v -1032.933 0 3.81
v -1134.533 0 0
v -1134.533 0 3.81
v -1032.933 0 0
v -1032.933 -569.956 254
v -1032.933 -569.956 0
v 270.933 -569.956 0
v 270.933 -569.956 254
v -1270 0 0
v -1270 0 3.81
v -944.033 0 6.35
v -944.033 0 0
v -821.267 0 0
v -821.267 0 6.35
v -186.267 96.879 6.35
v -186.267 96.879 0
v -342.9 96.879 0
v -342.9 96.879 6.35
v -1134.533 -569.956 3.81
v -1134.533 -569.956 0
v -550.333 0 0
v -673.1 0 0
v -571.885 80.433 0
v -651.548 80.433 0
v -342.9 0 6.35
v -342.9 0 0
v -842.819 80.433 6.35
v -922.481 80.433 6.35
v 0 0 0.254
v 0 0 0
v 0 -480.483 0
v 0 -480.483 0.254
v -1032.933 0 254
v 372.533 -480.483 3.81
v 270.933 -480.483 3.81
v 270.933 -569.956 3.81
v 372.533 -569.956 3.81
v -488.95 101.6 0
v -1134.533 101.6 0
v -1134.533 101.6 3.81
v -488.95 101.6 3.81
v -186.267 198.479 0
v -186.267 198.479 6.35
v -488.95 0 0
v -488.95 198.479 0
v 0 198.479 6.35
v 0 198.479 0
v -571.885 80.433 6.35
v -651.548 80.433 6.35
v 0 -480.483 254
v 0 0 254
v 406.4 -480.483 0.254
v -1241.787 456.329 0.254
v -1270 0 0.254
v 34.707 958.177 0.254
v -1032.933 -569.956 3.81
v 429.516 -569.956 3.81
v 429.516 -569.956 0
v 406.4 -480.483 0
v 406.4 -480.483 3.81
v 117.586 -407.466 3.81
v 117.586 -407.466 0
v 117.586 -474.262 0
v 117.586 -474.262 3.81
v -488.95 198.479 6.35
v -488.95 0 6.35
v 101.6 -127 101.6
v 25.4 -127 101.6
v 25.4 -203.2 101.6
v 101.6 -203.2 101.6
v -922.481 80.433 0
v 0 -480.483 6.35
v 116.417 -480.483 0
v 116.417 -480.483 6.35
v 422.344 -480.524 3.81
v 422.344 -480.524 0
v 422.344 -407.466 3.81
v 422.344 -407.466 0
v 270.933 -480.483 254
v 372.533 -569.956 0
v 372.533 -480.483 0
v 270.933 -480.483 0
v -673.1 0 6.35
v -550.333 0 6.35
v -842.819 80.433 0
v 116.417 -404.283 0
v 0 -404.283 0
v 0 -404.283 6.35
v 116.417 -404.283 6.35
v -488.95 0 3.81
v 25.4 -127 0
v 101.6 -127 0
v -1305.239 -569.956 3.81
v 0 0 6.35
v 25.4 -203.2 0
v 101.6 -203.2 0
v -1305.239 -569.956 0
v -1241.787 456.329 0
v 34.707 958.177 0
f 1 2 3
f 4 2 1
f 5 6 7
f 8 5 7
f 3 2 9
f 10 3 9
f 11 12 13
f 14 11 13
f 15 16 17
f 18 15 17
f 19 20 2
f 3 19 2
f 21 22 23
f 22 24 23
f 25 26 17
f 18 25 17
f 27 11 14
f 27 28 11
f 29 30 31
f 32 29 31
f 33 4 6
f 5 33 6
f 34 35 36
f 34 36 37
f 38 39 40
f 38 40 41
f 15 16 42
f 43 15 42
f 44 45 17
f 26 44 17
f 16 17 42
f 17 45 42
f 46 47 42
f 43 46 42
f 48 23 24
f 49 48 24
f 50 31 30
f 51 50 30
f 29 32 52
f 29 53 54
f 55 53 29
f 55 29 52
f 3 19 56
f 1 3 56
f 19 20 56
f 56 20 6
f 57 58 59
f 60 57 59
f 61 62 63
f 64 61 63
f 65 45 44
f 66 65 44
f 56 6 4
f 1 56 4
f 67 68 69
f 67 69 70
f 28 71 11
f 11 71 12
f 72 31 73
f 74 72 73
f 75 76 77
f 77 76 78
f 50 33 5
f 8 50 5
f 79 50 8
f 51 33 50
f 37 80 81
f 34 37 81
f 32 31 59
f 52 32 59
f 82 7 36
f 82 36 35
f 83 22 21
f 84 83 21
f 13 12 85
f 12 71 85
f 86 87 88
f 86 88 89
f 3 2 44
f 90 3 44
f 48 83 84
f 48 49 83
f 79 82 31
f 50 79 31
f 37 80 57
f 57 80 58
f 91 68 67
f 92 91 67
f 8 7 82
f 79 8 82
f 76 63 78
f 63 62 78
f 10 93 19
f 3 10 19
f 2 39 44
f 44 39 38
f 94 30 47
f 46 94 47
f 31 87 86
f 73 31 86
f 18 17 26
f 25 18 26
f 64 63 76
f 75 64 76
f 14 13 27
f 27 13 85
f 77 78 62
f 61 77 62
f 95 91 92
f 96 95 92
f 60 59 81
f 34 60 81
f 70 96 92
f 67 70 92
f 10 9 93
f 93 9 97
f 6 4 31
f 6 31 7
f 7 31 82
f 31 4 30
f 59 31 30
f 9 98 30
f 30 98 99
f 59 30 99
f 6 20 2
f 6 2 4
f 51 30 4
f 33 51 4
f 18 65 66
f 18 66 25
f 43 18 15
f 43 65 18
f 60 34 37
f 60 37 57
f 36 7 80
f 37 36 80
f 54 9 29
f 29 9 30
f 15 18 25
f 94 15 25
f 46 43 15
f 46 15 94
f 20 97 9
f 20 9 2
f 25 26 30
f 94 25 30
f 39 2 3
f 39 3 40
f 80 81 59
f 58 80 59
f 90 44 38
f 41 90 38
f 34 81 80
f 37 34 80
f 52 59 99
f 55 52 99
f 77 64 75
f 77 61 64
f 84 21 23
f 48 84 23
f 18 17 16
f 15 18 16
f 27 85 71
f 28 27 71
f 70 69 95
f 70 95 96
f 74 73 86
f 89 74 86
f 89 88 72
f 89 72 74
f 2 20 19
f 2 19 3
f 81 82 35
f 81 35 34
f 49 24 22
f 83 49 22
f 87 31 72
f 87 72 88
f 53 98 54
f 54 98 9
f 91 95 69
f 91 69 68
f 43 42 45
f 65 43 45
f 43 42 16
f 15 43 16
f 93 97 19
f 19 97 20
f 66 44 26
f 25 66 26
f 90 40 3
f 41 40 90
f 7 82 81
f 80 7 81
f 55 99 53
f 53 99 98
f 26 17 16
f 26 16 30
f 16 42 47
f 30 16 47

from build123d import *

# Parameters (mm, degrees)
F2_DEPTH  = 254
F3_W      = 116.416667
F3_H      = 76.2
F4_DEPTH  = 6.35
F5_W      = 76.2
F5_H      = 76.2
F6_DEPTH  = 101.6
F8_DEPTH  = 6.35
F9_W      = 101.6
F9_H      = 569.956277
F9_H_2    = 89.472944
F10_DEPTH = 3.81
F12_DEPTH = 3.81
F13_W     = 645.583333
F13_H     = 101.6
F14_DEPTH = 3.81
F16_DEPTH = 6.35
F17_DEPTH = 0.254


with BuildPart() as f2:
    # F1 (on face) → F2 (new body)
    with BuildSketch(Plane.XY):
        Polygon((0, 0), (-1032.933333, 0), (-1032.933333, -569.956277), (270.933333, -569.956277), (270.933333, -480.483333), (0, -480.483333), align=None)
    extrude(amount=F2_DEPTH)


with BuildPart() as f4:
    # F3 (on face) → F4 (new body)
    with BuildSketch(Plane.XY):
        with Locations((58.208333, -442.383333)):
            Rectangle(F3_W, F3_H)
        Polygon((-488.95, 198.47922), (-488.95, 0), (-342.9, 0), (-342.9, 96.87922), (-186.266667, 96.87922), (-186.266667, 198.47922), align=None)
    extrude(amount=F4_DEPTH)


with BuildPart() as f6:
    # F5 (on face) → F6 (new body)
    with BuildSketch(Plane.XY):
        with Locations((63.5, -165.1)):
            Rectangle(F5_W, F5_H)
    extrude(amount=F6_DEPTH)


with BuildPart() as f8:
    # F7 (on face) → F8 (new body)
    with BuildSketch(Plane.XY):
        Polygon((-673.1, 0), (-550.333333, 0), (-571.88538, 80.433333), (-651.547953, 80.433333), align=None)
        Polygon((-944.033333, 0), (-821.266667, 0), (-842.818713, 80.433333), (-922.481287, 80.433333), align=None)
    extrude(amount=F8_DEPTH)


with BuildPart() as f10:
    # F9 (on face) → F10 (new body)
    with BuildSketch(Plane.XY):
        with Locations((-1083.733333, -284.978139)):
            Rectangle(F9_W, F9_H)
        with Locations((321.733333, -525.219805)):
            Rectangle(F9_W, F9_H_2)
    extrude(amount=F10_DEPTH)


with BuildPart() as f12:
    # F11 (on face) → F12 (new body, through all)
    with BuildSketch(Plane.XY):
        Polygon((429.516294, -569.956277), (406.4, -480.483333), (372.533333, -480.483333), (372.533333, -569.956277), align=None)
        Polygon((-1134.533333, -569.956277), (-1134.533333, 0), (-1270, 0), (-1305.238767, -569.956277), align=None)
    extrude(amount=F12_DEPTH)


with BuildPart() as f14:
    # F13 (on face) → F14 (new body, through all)
    with BuildSketch(Plane.XY):
        with Locations((-811.741666, 50.8)):
            Rectangle(F13_W, F13_H)
        Polygon((117.585622, -474.26194), (422.343582, -480.524063), (422.343582, -407.465667), (117.585622, -407.465667), align=None)
    extrude(amount=F14_DEPTH)


with BuildPart() as f16:
    # F15 (on face) → F16 (new body, through all)
    with BuildSketch(Plane.XY):
        Polygon((0, 198.47922), (-186.266667, 198.47922), (-186.266667, 96.87922), (-342.9, 96.87922), (-342.9, 0), (0, 0), align=None)
    extrude(amount=F16_DEPTH)


with BuildPart() as f17:
    # F0 (on Top) → F17 (new body)
    with BuildSketch(Plane.XY):
        Polygon((-1270, 0), (0, 0), (0, -480.483333), (406.4, -480.483333), (34.706744, 958.176784), (-1241.786504, 456.328652), align=None)
    extrude(amount=F17_DEPTH)


solid = Compound([f2.part, f4.part, f6.part, f8.part, f10.part, f12.part, f14.part, f16.part, f17.part])
